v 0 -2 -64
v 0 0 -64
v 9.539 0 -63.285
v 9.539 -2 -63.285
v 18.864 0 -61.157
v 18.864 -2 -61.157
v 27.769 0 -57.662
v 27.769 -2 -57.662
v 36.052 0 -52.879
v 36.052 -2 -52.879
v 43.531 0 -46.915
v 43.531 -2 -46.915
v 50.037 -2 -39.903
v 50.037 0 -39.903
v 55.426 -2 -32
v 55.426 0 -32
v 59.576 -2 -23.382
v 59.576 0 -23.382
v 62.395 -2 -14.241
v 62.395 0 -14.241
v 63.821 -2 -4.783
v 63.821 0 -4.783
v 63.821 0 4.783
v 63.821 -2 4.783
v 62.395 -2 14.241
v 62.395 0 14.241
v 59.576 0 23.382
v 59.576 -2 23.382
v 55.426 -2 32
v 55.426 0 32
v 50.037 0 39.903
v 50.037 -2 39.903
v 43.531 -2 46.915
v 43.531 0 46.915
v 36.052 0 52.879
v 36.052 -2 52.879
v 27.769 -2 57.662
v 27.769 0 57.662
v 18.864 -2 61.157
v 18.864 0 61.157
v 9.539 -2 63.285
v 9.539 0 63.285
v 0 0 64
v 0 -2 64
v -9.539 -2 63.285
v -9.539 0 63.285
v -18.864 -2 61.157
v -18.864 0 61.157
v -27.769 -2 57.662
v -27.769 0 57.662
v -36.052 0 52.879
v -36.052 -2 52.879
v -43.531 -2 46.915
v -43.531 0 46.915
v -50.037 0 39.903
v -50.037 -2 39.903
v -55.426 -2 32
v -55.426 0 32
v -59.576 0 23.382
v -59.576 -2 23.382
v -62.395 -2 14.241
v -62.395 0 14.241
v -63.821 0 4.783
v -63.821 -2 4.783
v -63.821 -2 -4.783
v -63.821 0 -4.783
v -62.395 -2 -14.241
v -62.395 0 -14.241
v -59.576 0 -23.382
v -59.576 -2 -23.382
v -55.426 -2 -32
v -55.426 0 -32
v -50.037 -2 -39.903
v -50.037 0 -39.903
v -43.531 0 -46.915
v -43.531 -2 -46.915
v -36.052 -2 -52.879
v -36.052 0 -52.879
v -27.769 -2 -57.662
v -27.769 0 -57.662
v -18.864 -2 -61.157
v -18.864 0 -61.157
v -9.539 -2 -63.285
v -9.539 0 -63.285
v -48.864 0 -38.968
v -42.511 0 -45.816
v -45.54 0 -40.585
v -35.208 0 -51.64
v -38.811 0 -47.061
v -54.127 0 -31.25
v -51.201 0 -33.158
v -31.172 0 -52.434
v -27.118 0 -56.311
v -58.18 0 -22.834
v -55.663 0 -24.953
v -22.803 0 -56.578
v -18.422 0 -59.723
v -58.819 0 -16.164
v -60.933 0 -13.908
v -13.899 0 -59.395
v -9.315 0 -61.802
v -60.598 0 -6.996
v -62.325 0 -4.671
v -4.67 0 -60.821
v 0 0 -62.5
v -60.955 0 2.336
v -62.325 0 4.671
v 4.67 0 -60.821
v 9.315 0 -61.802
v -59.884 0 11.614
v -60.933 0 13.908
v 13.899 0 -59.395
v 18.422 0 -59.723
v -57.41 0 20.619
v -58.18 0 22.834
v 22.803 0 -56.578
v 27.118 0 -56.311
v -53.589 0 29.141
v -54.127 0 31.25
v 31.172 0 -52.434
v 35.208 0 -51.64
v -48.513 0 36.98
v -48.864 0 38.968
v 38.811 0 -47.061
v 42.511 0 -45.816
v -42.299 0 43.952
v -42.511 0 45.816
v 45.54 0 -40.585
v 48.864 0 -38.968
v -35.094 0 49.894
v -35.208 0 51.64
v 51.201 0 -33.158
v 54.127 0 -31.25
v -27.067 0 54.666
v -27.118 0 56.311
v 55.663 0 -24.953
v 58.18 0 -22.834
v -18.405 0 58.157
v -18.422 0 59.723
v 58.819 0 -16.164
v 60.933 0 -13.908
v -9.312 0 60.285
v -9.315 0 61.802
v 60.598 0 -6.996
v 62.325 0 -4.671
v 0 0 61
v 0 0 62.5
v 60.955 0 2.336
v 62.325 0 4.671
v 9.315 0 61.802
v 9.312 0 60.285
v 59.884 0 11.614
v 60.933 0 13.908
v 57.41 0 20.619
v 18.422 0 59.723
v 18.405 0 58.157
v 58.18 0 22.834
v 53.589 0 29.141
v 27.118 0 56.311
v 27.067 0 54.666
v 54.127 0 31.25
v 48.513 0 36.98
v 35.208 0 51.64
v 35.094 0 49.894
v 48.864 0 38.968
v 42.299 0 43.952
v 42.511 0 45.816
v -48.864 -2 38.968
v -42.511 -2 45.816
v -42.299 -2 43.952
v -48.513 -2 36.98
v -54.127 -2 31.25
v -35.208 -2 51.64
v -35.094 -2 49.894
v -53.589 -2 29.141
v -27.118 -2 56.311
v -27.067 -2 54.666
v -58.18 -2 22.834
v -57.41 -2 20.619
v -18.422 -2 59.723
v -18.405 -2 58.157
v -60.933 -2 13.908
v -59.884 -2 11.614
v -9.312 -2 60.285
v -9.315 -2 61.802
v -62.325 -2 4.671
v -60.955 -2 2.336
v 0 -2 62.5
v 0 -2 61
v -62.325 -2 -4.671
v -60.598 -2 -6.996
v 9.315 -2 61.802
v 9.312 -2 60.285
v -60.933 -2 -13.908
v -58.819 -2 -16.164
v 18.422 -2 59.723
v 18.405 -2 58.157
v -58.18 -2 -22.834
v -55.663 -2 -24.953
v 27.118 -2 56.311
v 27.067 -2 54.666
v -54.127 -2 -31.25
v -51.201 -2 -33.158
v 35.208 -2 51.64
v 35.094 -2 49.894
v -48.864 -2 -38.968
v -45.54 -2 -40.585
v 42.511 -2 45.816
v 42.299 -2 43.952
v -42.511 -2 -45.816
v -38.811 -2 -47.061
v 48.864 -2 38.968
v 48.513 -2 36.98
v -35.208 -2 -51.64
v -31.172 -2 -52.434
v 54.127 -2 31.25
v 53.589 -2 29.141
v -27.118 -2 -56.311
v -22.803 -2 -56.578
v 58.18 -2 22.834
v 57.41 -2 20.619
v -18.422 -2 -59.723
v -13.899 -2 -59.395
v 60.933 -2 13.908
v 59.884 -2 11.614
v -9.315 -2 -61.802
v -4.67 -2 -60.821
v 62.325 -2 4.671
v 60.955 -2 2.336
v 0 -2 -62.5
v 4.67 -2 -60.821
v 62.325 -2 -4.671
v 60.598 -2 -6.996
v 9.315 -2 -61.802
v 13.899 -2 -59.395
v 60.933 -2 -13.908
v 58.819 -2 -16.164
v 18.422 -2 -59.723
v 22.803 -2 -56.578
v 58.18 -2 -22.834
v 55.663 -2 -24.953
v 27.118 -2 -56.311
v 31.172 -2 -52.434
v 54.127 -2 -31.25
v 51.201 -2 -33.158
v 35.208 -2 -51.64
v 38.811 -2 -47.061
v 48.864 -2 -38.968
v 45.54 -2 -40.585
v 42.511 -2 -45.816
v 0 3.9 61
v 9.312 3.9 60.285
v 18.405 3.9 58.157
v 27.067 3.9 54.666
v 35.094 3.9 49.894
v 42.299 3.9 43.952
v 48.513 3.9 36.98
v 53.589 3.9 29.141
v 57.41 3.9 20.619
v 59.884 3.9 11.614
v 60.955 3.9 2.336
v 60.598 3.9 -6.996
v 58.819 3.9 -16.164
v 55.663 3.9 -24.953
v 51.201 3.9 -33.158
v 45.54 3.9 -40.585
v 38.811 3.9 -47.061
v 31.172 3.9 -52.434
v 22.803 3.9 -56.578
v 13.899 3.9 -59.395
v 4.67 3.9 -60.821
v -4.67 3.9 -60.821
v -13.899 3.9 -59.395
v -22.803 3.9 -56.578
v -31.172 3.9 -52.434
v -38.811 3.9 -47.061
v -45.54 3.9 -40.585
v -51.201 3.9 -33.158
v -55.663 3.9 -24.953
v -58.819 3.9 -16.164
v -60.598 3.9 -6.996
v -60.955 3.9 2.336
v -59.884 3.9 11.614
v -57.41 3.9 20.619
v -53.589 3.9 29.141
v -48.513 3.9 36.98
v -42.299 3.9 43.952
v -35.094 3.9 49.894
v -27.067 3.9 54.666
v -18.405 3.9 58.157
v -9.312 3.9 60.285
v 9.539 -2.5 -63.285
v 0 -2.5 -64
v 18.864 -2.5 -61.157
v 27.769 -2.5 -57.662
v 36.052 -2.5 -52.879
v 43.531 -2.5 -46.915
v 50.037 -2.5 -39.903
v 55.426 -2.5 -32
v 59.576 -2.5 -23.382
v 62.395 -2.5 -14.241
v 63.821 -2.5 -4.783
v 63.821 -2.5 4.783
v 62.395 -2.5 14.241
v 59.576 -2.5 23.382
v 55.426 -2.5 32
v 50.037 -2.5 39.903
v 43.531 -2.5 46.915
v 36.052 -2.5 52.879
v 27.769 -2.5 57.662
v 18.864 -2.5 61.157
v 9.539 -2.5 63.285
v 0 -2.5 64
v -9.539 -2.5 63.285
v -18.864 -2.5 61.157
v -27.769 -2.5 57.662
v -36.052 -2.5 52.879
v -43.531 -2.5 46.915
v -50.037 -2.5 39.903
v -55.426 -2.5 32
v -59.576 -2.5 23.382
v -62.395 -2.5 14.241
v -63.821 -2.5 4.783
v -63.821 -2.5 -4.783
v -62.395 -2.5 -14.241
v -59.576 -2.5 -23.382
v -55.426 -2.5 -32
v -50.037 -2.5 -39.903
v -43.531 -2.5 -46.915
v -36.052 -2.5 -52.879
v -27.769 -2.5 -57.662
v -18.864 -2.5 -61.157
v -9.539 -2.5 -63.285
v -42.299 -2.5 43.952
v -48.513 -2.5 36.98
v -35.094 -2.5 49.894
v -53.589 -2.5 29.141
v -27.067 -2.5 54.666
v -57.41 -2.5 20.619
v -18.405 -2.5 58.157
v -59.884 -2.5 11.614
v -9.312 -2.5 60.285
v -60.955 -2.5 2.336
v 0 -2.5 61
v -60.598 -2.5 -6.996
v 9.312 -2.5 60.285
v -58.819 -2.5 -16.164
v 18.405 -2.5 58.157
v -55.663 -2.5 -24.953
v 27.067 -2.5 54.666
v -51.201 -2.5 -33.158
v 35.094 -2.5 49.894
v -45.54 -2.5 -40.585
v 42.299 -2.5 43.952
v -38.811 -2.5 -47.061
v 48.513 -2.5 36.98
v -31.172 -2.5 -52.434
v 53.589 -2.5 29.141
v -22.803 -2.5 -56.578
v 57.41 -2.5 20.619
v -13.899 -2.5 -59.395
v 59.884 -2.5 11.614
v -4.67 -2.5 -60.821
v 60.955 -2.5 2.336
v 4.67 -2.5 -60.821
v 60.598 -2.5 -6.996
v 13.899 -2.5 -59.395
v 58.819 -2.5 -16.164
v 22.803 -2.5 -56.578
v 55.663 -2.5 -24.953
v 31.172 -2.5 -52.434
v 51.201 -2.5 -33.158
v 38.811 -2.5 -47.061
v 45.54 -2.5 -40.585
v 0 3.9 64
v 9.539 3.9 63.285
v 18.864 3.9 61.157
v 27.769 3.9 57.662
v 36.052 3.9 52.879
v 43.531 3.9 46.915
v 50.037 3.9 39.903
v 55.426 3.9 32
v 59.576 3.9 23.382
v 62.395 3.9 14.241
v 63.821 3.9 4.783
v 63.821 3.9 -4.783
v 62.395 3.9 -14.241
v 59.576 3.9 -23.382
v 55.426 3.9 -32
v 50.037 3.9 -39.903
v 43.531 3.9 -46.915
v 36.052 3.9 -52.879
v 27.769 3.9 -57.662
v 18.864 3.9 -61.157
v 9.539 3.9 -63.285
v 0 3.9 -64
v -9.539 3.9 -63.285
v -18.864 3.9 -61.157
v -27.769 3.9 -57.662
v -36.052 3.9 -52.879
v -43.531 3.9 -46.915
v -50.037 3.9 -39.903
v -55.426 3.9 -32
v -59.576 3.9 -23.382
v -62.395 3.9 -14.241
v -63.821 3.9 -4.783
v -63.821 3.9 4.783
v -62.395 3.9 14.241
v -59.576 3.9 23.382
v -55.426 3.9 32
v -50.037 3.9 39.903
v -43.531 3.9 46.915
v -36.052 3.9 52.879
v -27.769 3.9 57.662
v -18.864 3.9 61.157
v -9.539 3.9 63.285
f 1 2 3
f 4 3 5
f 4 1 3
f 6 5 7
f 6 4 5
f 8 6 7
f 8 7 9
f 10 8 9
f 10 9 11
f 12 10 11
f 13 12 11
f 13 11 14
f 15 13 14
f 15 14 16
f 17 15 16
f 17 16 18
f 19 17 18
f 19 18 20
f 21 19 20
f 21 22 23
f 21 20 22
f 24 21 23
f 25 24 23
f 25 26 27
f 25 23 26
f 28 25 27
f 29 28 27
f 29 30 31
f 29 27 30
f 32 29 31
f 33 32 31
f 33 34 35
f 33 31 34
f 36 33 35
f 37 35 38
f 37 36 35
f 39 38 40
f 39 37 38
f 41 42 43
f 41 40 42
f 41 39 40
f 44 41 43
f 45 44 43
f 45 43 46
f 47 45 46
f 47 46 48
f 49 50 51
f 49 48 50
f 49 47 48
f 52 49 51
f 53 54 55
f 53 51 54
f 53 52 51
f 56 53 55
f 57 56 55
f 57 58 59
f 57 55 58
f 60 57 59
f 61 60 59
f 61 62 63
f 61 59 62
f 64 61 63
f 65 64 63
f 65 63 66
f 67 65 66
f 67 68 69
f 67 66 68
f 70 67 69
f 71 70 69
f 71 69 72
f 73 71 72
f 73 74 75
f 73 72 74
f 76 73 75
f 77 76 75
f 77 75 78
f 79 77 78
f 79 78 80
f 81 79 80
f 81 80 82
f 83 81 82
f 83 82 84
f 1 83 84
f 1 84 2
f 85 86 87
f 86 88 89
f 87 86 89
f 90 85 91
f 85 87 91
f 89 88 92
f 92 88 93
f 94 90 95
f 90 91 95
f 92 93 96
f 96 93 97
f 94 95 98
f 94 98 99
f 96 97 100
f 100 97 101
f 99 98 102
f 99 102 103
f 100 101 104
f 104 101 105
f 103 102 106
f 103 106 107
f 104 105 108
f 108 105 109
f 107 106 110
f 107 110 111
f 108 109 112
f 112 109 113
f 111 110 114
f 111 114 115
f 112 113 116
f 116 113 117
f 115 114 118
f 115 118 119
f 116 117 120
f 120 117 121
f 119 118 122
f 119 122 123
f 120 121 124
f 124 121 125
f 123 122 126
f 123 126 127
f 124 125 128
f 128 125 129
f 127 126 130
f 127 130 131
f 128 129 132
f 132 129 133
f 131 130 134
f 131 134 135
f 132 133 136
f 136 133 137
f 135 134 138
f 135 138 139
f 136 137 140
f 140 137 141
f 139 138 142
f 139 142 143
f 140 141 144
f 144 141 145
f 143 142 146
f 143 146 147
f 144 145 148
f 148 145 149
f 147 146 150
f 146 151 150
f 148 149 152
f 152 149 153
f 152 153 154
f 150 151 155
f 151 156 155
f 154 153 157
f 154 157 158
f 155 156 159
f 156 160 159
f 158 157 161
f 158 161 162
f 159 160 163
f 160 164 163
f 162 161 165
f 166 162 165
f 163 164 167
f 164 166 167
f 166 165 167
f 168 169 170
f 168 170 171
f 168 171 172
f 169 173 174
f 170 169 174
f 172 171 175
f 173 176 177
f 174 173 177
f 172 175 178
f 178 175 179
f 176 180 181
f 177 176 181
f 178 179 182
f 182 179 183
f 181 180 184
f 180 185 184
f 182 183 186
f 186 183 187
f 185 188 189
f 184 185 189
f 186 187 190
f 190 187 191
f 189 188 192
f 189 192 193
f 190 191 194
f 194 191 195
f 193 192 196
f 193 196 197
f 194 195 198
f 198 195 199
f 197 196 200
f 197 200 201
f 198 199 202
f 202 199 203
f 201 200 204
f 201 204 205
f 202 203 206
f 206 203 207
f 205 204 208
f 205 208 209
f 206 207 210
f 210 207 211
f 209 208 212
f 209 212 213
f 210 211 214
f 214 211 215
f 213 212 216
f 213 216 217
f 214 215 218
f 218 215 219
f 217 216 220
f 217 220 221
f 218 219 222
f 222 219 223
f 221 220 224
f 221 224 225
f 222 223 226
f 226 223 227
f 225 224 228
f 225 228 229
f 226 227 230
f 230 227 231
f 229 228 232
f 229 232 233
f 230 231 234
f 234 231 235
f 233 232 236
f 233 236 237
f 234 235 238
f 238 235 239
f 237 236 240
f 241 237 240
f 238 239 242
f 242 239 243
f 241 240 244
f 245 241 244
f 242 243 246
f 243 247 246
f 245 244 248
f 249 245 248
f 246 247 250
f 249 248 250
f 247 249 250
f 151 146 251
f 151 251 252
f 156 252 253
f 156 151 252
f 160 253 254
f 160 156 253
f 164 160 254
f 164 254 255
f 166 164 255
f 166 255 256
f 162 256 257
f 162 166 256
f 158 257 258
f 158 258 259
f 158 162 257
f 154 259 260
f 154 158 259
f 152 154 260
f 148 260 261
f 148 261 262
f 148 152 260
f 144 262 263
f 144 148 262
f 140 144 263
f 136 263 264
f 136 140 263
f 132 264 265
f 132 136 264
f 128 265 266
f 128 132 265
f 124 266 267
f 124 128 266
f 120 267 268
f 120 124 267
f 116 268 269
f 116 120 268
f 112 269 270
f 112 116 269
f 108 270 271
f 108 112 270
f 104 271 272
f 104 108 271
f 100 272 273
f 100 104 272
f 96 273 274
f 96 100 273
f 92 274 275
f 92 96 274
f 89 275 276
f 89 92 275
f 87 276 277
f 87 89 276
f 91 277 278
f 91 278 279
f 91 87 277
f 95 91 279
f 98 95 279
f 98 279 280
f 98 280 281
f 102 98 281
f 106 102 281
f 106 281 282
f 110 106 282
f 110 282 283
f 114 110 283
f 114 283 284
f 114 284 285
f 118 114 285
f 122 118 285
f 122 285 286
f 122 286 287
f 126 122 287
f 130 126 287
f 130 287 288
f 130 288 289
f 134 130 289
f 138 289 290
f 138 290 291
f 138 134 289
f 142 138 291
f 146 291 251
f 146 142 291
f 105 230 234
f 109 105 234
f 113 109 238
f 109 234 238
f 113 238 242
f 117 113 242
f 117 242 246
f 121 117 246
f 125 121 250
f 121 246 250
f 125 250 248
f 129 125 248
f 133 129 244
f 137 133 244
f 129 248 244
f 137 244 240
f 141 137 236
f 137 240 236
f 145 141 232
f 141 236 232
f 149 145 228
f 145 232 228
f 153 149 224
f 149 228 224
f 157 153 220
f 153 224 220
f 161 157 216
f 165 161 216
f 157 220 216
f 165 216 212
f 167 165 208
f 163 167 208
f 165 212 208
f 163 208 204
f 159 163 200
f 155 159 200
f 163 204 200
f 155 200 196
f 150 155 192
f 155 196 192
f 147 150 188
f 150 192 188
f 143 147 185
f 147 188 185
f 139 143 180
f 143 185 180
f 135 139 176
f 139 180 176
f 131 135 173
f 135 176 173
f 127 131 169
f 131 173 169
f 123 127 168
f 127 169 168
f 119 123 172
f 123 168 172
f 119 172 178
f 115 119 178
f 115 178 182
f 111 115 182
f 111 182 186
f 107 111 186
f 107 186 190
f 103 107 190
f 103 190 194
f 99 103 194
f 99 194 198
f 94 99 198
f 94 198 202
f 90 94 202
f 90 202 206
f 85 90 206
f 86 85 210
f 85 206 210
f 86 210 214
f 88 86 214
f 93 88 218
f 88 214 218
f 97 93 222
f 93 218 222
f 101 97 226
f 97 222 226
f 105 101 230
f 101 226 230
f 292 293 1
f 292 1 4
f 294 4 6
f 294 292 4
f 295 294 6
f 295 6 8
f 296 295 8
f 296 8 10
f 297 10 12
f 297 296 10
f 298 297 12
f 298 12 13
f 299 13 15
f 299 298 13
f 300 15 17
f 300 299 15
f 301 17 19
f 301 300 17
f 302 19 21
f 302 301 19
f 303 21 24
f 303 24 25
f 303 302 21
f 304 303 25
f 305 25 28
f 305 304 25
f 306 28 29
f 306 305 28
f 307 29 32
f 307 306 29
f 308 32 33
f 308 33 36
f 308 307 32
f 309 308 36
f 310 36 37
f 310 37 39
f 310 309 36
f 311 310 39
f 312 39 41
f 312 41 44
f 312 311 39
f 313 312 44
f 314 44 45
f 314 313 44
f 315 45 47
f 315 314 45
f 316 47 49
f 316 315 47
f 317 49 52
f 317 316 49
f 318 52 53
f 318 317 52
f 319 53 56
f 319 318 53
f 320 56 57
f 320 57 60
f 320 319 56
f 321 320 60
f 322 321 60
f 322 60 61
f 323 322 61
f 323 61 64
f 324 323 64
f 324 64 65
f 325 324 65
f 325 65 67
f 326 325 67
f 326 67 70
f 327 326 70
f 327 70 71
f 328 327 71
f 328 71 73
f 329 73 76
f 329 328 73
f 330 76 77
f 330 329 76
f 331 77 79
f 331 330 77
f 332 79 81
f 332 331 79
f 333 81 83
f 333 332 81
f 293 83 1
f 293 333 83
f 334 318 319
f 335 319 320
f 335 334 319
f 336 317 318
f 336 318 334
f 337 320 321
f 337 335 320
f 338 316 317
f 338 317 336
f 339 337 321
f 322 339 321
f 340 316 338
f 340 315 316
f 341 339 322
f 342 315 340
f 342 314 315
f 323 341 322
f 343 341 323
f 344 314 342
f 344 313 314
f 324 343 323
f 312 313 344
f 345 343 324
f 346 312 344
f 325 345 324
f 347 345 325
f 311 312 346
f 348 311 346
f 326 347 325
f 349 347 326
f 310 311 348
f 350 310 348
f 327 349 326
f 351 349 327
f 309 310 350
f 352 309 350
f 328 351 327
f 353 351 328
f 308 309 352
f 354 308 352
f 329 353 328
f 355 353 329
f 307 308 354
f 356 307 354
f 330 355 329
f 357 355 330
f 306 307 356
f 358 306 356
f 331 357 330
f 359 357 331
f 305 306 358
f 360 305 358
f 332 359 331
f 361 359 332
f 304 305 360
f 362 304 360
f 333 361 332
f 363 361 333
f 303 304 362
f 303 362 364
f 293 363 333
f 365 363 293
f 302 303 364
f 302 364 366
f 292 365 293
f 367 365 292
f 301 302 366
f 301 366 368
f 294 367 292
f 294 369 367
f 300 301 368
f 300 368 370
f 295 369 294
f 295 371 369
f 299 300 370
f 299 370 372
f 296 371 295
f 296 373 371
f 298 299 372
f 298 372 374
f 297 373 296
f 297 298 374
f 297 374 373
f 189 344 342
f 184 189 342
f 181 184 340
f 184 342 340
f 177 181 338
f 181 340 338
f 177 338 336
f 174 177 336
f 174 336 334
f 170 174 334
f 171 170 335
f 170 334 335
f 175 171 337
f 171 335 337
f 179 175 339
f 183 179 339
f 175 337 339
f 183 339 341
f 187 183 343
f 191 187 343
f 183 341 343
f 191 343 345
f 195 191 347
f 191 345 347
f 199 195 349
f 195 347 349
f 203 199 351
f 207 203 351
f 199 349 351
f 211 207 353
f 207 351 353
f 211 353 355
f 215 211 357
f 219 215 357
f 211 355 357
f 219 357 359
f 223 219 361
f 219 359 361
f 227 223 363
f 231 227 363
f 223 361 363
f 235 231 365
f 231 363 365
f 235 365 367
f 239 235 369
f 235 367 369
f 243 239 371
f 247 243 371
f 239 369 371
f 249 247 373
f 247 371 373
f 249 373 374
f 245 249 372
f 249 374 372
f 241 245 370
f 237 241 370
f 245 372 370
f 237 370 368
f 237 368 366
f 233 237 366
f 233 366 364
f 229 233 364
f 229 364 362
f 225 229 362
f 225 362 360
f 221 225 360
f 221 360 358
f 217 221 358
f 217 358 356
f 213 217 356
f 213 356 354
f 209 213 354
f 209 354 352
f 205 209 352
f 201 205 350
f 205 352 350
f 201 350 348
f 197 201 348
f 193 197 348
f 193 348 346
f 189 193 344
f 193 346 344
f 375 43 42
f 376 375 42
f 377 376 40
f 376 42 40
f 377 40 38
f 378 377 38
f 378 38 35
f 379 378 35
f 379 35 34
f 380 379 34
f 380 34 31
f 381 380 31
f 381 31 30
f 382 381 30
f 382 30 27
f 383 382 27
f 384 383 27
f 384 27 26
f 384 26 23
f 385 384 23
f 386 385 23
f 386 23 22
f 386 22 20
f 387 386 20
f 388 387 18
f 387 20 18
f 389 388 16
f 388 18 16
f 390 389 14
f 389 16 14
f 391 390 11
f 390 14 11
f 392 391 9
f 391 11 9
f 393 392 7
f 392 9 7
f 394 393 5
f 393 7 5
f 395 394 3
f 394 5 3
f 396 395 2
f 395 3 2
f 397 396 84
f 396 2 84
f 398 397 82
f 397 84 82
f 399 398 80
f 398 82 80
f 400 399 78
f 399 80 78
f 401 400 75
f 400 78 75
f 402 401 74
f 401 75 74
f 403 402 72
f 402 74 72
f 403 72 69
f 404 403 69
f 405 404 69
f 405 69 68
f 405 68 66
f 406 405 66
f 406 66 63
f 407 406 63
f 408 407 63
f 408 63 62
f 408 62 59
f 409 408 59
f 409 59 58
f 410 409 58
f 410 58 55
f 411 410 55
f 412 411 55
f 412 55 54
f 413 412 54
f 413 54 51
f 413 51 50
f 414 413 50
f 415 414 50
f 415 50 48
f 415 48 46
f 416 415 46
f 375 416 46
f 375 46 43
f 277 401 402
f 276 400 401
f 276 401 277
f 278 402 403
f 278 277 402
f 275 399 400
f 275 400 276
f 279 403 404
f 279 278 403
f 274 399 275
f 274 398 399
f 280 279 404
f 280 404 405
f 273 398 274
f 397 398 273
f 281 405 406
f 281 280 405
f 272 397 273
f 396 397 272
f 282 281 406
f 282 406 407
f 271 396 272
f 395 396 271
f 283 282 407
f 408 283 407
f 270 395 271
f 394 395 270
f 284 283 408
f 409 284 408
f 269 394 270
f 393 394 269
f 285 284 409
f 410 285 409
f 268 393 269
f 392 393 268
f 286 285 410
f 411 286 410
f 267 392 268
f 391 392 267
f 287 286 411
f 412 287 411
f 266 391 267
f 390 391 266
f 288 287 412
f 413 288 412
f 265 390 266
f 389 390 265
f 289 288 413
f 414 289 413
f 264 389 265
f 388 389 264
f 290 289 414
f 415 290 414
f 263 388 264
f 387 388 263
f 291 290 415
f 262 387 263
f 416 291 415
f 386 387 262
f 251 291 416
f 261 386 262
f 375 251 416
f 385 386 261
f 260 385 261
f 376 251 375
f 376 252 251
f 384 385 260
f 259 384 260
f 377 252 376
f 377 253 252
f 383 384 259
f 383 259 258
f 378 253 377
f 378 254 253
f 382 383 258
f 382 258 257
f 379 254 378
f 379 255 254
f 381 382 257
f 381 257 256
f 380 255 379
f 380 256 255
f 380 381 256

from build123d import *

# Parameters (mm, degrees)
CROQUIS1_R              = 64
CROQUIS1_R_2            = 61
SALIENTE_EXTRUIR1_DEPTH = 3.9
SALIENTE_EXTRUIR2_START = 2
CROQUIS2_R              = 64
CROQUIS2_R_2            = 62.5
SALIENTE_EXTRUIR2_DEPTH = 2
SALIENTE_EXTRUIR3_START = 0.5
CROQUIS3_R              = 64
CROQUIS3_R_2            = 61
SALIENTE_EXTRUIR3_DEPTH = 0.5


with BuildPart() as part:
    # Croquis1 → Saliente-Extruir1 (new body)
    with BuildSketch(Plane(origin=(0, 0, 0), x_dir=(1, 0, 0), z_dir=(0, 1, 0))):
        with Locations(Location((0, 0, 0), (0, 0, 270))):
            Circle(CROQUIS1_R)
        with Locations(Location((0, 0, 0), (0, 0, 270))):
            Circle(CROQUIS1_R_2, mode=Mode.SUBTRACT)
    extrude(amount=SALIENTE_EXTRUIR1_DEPTH)

    # Croquis2 → Saliente-Extruir2 (add)
    with BuildSketch(Plane.XZ.offset(SALIENTE_EXTRUIR2_START)):
        with Locations(Location((0, 0, 0), (0, 0, 270))):
            Circle(CROQUIS2_R)
        with Locations(Location((0, 0, 0), (0, 0, 270))):
            Circle(CROQUIS2_R_2, mode=Mode.SUBTRACT)
    extrude(amount=-SALIENTE_EXTRUIR2_DEPTH)

    # Croquis3 → Saliente-Extruir3 (add)
    with BuildSketch(Plane.XZ.offset(2).offset(SALIENTE_EXTRUIR3_START)):
        with Locations(Location((0, 0, 0), (0, 0, 270))):
            Circle(CROQUIS3_R)
        with Locations(Location((0, 0, 0), (0, 0, 90))):
            Circle(CROQUIS3_R_2, mode=Mode.SUBTRACT)
    extrude(amount=-SALIENTE_EXTRUIR3_DEPTH)


solid = part.part
